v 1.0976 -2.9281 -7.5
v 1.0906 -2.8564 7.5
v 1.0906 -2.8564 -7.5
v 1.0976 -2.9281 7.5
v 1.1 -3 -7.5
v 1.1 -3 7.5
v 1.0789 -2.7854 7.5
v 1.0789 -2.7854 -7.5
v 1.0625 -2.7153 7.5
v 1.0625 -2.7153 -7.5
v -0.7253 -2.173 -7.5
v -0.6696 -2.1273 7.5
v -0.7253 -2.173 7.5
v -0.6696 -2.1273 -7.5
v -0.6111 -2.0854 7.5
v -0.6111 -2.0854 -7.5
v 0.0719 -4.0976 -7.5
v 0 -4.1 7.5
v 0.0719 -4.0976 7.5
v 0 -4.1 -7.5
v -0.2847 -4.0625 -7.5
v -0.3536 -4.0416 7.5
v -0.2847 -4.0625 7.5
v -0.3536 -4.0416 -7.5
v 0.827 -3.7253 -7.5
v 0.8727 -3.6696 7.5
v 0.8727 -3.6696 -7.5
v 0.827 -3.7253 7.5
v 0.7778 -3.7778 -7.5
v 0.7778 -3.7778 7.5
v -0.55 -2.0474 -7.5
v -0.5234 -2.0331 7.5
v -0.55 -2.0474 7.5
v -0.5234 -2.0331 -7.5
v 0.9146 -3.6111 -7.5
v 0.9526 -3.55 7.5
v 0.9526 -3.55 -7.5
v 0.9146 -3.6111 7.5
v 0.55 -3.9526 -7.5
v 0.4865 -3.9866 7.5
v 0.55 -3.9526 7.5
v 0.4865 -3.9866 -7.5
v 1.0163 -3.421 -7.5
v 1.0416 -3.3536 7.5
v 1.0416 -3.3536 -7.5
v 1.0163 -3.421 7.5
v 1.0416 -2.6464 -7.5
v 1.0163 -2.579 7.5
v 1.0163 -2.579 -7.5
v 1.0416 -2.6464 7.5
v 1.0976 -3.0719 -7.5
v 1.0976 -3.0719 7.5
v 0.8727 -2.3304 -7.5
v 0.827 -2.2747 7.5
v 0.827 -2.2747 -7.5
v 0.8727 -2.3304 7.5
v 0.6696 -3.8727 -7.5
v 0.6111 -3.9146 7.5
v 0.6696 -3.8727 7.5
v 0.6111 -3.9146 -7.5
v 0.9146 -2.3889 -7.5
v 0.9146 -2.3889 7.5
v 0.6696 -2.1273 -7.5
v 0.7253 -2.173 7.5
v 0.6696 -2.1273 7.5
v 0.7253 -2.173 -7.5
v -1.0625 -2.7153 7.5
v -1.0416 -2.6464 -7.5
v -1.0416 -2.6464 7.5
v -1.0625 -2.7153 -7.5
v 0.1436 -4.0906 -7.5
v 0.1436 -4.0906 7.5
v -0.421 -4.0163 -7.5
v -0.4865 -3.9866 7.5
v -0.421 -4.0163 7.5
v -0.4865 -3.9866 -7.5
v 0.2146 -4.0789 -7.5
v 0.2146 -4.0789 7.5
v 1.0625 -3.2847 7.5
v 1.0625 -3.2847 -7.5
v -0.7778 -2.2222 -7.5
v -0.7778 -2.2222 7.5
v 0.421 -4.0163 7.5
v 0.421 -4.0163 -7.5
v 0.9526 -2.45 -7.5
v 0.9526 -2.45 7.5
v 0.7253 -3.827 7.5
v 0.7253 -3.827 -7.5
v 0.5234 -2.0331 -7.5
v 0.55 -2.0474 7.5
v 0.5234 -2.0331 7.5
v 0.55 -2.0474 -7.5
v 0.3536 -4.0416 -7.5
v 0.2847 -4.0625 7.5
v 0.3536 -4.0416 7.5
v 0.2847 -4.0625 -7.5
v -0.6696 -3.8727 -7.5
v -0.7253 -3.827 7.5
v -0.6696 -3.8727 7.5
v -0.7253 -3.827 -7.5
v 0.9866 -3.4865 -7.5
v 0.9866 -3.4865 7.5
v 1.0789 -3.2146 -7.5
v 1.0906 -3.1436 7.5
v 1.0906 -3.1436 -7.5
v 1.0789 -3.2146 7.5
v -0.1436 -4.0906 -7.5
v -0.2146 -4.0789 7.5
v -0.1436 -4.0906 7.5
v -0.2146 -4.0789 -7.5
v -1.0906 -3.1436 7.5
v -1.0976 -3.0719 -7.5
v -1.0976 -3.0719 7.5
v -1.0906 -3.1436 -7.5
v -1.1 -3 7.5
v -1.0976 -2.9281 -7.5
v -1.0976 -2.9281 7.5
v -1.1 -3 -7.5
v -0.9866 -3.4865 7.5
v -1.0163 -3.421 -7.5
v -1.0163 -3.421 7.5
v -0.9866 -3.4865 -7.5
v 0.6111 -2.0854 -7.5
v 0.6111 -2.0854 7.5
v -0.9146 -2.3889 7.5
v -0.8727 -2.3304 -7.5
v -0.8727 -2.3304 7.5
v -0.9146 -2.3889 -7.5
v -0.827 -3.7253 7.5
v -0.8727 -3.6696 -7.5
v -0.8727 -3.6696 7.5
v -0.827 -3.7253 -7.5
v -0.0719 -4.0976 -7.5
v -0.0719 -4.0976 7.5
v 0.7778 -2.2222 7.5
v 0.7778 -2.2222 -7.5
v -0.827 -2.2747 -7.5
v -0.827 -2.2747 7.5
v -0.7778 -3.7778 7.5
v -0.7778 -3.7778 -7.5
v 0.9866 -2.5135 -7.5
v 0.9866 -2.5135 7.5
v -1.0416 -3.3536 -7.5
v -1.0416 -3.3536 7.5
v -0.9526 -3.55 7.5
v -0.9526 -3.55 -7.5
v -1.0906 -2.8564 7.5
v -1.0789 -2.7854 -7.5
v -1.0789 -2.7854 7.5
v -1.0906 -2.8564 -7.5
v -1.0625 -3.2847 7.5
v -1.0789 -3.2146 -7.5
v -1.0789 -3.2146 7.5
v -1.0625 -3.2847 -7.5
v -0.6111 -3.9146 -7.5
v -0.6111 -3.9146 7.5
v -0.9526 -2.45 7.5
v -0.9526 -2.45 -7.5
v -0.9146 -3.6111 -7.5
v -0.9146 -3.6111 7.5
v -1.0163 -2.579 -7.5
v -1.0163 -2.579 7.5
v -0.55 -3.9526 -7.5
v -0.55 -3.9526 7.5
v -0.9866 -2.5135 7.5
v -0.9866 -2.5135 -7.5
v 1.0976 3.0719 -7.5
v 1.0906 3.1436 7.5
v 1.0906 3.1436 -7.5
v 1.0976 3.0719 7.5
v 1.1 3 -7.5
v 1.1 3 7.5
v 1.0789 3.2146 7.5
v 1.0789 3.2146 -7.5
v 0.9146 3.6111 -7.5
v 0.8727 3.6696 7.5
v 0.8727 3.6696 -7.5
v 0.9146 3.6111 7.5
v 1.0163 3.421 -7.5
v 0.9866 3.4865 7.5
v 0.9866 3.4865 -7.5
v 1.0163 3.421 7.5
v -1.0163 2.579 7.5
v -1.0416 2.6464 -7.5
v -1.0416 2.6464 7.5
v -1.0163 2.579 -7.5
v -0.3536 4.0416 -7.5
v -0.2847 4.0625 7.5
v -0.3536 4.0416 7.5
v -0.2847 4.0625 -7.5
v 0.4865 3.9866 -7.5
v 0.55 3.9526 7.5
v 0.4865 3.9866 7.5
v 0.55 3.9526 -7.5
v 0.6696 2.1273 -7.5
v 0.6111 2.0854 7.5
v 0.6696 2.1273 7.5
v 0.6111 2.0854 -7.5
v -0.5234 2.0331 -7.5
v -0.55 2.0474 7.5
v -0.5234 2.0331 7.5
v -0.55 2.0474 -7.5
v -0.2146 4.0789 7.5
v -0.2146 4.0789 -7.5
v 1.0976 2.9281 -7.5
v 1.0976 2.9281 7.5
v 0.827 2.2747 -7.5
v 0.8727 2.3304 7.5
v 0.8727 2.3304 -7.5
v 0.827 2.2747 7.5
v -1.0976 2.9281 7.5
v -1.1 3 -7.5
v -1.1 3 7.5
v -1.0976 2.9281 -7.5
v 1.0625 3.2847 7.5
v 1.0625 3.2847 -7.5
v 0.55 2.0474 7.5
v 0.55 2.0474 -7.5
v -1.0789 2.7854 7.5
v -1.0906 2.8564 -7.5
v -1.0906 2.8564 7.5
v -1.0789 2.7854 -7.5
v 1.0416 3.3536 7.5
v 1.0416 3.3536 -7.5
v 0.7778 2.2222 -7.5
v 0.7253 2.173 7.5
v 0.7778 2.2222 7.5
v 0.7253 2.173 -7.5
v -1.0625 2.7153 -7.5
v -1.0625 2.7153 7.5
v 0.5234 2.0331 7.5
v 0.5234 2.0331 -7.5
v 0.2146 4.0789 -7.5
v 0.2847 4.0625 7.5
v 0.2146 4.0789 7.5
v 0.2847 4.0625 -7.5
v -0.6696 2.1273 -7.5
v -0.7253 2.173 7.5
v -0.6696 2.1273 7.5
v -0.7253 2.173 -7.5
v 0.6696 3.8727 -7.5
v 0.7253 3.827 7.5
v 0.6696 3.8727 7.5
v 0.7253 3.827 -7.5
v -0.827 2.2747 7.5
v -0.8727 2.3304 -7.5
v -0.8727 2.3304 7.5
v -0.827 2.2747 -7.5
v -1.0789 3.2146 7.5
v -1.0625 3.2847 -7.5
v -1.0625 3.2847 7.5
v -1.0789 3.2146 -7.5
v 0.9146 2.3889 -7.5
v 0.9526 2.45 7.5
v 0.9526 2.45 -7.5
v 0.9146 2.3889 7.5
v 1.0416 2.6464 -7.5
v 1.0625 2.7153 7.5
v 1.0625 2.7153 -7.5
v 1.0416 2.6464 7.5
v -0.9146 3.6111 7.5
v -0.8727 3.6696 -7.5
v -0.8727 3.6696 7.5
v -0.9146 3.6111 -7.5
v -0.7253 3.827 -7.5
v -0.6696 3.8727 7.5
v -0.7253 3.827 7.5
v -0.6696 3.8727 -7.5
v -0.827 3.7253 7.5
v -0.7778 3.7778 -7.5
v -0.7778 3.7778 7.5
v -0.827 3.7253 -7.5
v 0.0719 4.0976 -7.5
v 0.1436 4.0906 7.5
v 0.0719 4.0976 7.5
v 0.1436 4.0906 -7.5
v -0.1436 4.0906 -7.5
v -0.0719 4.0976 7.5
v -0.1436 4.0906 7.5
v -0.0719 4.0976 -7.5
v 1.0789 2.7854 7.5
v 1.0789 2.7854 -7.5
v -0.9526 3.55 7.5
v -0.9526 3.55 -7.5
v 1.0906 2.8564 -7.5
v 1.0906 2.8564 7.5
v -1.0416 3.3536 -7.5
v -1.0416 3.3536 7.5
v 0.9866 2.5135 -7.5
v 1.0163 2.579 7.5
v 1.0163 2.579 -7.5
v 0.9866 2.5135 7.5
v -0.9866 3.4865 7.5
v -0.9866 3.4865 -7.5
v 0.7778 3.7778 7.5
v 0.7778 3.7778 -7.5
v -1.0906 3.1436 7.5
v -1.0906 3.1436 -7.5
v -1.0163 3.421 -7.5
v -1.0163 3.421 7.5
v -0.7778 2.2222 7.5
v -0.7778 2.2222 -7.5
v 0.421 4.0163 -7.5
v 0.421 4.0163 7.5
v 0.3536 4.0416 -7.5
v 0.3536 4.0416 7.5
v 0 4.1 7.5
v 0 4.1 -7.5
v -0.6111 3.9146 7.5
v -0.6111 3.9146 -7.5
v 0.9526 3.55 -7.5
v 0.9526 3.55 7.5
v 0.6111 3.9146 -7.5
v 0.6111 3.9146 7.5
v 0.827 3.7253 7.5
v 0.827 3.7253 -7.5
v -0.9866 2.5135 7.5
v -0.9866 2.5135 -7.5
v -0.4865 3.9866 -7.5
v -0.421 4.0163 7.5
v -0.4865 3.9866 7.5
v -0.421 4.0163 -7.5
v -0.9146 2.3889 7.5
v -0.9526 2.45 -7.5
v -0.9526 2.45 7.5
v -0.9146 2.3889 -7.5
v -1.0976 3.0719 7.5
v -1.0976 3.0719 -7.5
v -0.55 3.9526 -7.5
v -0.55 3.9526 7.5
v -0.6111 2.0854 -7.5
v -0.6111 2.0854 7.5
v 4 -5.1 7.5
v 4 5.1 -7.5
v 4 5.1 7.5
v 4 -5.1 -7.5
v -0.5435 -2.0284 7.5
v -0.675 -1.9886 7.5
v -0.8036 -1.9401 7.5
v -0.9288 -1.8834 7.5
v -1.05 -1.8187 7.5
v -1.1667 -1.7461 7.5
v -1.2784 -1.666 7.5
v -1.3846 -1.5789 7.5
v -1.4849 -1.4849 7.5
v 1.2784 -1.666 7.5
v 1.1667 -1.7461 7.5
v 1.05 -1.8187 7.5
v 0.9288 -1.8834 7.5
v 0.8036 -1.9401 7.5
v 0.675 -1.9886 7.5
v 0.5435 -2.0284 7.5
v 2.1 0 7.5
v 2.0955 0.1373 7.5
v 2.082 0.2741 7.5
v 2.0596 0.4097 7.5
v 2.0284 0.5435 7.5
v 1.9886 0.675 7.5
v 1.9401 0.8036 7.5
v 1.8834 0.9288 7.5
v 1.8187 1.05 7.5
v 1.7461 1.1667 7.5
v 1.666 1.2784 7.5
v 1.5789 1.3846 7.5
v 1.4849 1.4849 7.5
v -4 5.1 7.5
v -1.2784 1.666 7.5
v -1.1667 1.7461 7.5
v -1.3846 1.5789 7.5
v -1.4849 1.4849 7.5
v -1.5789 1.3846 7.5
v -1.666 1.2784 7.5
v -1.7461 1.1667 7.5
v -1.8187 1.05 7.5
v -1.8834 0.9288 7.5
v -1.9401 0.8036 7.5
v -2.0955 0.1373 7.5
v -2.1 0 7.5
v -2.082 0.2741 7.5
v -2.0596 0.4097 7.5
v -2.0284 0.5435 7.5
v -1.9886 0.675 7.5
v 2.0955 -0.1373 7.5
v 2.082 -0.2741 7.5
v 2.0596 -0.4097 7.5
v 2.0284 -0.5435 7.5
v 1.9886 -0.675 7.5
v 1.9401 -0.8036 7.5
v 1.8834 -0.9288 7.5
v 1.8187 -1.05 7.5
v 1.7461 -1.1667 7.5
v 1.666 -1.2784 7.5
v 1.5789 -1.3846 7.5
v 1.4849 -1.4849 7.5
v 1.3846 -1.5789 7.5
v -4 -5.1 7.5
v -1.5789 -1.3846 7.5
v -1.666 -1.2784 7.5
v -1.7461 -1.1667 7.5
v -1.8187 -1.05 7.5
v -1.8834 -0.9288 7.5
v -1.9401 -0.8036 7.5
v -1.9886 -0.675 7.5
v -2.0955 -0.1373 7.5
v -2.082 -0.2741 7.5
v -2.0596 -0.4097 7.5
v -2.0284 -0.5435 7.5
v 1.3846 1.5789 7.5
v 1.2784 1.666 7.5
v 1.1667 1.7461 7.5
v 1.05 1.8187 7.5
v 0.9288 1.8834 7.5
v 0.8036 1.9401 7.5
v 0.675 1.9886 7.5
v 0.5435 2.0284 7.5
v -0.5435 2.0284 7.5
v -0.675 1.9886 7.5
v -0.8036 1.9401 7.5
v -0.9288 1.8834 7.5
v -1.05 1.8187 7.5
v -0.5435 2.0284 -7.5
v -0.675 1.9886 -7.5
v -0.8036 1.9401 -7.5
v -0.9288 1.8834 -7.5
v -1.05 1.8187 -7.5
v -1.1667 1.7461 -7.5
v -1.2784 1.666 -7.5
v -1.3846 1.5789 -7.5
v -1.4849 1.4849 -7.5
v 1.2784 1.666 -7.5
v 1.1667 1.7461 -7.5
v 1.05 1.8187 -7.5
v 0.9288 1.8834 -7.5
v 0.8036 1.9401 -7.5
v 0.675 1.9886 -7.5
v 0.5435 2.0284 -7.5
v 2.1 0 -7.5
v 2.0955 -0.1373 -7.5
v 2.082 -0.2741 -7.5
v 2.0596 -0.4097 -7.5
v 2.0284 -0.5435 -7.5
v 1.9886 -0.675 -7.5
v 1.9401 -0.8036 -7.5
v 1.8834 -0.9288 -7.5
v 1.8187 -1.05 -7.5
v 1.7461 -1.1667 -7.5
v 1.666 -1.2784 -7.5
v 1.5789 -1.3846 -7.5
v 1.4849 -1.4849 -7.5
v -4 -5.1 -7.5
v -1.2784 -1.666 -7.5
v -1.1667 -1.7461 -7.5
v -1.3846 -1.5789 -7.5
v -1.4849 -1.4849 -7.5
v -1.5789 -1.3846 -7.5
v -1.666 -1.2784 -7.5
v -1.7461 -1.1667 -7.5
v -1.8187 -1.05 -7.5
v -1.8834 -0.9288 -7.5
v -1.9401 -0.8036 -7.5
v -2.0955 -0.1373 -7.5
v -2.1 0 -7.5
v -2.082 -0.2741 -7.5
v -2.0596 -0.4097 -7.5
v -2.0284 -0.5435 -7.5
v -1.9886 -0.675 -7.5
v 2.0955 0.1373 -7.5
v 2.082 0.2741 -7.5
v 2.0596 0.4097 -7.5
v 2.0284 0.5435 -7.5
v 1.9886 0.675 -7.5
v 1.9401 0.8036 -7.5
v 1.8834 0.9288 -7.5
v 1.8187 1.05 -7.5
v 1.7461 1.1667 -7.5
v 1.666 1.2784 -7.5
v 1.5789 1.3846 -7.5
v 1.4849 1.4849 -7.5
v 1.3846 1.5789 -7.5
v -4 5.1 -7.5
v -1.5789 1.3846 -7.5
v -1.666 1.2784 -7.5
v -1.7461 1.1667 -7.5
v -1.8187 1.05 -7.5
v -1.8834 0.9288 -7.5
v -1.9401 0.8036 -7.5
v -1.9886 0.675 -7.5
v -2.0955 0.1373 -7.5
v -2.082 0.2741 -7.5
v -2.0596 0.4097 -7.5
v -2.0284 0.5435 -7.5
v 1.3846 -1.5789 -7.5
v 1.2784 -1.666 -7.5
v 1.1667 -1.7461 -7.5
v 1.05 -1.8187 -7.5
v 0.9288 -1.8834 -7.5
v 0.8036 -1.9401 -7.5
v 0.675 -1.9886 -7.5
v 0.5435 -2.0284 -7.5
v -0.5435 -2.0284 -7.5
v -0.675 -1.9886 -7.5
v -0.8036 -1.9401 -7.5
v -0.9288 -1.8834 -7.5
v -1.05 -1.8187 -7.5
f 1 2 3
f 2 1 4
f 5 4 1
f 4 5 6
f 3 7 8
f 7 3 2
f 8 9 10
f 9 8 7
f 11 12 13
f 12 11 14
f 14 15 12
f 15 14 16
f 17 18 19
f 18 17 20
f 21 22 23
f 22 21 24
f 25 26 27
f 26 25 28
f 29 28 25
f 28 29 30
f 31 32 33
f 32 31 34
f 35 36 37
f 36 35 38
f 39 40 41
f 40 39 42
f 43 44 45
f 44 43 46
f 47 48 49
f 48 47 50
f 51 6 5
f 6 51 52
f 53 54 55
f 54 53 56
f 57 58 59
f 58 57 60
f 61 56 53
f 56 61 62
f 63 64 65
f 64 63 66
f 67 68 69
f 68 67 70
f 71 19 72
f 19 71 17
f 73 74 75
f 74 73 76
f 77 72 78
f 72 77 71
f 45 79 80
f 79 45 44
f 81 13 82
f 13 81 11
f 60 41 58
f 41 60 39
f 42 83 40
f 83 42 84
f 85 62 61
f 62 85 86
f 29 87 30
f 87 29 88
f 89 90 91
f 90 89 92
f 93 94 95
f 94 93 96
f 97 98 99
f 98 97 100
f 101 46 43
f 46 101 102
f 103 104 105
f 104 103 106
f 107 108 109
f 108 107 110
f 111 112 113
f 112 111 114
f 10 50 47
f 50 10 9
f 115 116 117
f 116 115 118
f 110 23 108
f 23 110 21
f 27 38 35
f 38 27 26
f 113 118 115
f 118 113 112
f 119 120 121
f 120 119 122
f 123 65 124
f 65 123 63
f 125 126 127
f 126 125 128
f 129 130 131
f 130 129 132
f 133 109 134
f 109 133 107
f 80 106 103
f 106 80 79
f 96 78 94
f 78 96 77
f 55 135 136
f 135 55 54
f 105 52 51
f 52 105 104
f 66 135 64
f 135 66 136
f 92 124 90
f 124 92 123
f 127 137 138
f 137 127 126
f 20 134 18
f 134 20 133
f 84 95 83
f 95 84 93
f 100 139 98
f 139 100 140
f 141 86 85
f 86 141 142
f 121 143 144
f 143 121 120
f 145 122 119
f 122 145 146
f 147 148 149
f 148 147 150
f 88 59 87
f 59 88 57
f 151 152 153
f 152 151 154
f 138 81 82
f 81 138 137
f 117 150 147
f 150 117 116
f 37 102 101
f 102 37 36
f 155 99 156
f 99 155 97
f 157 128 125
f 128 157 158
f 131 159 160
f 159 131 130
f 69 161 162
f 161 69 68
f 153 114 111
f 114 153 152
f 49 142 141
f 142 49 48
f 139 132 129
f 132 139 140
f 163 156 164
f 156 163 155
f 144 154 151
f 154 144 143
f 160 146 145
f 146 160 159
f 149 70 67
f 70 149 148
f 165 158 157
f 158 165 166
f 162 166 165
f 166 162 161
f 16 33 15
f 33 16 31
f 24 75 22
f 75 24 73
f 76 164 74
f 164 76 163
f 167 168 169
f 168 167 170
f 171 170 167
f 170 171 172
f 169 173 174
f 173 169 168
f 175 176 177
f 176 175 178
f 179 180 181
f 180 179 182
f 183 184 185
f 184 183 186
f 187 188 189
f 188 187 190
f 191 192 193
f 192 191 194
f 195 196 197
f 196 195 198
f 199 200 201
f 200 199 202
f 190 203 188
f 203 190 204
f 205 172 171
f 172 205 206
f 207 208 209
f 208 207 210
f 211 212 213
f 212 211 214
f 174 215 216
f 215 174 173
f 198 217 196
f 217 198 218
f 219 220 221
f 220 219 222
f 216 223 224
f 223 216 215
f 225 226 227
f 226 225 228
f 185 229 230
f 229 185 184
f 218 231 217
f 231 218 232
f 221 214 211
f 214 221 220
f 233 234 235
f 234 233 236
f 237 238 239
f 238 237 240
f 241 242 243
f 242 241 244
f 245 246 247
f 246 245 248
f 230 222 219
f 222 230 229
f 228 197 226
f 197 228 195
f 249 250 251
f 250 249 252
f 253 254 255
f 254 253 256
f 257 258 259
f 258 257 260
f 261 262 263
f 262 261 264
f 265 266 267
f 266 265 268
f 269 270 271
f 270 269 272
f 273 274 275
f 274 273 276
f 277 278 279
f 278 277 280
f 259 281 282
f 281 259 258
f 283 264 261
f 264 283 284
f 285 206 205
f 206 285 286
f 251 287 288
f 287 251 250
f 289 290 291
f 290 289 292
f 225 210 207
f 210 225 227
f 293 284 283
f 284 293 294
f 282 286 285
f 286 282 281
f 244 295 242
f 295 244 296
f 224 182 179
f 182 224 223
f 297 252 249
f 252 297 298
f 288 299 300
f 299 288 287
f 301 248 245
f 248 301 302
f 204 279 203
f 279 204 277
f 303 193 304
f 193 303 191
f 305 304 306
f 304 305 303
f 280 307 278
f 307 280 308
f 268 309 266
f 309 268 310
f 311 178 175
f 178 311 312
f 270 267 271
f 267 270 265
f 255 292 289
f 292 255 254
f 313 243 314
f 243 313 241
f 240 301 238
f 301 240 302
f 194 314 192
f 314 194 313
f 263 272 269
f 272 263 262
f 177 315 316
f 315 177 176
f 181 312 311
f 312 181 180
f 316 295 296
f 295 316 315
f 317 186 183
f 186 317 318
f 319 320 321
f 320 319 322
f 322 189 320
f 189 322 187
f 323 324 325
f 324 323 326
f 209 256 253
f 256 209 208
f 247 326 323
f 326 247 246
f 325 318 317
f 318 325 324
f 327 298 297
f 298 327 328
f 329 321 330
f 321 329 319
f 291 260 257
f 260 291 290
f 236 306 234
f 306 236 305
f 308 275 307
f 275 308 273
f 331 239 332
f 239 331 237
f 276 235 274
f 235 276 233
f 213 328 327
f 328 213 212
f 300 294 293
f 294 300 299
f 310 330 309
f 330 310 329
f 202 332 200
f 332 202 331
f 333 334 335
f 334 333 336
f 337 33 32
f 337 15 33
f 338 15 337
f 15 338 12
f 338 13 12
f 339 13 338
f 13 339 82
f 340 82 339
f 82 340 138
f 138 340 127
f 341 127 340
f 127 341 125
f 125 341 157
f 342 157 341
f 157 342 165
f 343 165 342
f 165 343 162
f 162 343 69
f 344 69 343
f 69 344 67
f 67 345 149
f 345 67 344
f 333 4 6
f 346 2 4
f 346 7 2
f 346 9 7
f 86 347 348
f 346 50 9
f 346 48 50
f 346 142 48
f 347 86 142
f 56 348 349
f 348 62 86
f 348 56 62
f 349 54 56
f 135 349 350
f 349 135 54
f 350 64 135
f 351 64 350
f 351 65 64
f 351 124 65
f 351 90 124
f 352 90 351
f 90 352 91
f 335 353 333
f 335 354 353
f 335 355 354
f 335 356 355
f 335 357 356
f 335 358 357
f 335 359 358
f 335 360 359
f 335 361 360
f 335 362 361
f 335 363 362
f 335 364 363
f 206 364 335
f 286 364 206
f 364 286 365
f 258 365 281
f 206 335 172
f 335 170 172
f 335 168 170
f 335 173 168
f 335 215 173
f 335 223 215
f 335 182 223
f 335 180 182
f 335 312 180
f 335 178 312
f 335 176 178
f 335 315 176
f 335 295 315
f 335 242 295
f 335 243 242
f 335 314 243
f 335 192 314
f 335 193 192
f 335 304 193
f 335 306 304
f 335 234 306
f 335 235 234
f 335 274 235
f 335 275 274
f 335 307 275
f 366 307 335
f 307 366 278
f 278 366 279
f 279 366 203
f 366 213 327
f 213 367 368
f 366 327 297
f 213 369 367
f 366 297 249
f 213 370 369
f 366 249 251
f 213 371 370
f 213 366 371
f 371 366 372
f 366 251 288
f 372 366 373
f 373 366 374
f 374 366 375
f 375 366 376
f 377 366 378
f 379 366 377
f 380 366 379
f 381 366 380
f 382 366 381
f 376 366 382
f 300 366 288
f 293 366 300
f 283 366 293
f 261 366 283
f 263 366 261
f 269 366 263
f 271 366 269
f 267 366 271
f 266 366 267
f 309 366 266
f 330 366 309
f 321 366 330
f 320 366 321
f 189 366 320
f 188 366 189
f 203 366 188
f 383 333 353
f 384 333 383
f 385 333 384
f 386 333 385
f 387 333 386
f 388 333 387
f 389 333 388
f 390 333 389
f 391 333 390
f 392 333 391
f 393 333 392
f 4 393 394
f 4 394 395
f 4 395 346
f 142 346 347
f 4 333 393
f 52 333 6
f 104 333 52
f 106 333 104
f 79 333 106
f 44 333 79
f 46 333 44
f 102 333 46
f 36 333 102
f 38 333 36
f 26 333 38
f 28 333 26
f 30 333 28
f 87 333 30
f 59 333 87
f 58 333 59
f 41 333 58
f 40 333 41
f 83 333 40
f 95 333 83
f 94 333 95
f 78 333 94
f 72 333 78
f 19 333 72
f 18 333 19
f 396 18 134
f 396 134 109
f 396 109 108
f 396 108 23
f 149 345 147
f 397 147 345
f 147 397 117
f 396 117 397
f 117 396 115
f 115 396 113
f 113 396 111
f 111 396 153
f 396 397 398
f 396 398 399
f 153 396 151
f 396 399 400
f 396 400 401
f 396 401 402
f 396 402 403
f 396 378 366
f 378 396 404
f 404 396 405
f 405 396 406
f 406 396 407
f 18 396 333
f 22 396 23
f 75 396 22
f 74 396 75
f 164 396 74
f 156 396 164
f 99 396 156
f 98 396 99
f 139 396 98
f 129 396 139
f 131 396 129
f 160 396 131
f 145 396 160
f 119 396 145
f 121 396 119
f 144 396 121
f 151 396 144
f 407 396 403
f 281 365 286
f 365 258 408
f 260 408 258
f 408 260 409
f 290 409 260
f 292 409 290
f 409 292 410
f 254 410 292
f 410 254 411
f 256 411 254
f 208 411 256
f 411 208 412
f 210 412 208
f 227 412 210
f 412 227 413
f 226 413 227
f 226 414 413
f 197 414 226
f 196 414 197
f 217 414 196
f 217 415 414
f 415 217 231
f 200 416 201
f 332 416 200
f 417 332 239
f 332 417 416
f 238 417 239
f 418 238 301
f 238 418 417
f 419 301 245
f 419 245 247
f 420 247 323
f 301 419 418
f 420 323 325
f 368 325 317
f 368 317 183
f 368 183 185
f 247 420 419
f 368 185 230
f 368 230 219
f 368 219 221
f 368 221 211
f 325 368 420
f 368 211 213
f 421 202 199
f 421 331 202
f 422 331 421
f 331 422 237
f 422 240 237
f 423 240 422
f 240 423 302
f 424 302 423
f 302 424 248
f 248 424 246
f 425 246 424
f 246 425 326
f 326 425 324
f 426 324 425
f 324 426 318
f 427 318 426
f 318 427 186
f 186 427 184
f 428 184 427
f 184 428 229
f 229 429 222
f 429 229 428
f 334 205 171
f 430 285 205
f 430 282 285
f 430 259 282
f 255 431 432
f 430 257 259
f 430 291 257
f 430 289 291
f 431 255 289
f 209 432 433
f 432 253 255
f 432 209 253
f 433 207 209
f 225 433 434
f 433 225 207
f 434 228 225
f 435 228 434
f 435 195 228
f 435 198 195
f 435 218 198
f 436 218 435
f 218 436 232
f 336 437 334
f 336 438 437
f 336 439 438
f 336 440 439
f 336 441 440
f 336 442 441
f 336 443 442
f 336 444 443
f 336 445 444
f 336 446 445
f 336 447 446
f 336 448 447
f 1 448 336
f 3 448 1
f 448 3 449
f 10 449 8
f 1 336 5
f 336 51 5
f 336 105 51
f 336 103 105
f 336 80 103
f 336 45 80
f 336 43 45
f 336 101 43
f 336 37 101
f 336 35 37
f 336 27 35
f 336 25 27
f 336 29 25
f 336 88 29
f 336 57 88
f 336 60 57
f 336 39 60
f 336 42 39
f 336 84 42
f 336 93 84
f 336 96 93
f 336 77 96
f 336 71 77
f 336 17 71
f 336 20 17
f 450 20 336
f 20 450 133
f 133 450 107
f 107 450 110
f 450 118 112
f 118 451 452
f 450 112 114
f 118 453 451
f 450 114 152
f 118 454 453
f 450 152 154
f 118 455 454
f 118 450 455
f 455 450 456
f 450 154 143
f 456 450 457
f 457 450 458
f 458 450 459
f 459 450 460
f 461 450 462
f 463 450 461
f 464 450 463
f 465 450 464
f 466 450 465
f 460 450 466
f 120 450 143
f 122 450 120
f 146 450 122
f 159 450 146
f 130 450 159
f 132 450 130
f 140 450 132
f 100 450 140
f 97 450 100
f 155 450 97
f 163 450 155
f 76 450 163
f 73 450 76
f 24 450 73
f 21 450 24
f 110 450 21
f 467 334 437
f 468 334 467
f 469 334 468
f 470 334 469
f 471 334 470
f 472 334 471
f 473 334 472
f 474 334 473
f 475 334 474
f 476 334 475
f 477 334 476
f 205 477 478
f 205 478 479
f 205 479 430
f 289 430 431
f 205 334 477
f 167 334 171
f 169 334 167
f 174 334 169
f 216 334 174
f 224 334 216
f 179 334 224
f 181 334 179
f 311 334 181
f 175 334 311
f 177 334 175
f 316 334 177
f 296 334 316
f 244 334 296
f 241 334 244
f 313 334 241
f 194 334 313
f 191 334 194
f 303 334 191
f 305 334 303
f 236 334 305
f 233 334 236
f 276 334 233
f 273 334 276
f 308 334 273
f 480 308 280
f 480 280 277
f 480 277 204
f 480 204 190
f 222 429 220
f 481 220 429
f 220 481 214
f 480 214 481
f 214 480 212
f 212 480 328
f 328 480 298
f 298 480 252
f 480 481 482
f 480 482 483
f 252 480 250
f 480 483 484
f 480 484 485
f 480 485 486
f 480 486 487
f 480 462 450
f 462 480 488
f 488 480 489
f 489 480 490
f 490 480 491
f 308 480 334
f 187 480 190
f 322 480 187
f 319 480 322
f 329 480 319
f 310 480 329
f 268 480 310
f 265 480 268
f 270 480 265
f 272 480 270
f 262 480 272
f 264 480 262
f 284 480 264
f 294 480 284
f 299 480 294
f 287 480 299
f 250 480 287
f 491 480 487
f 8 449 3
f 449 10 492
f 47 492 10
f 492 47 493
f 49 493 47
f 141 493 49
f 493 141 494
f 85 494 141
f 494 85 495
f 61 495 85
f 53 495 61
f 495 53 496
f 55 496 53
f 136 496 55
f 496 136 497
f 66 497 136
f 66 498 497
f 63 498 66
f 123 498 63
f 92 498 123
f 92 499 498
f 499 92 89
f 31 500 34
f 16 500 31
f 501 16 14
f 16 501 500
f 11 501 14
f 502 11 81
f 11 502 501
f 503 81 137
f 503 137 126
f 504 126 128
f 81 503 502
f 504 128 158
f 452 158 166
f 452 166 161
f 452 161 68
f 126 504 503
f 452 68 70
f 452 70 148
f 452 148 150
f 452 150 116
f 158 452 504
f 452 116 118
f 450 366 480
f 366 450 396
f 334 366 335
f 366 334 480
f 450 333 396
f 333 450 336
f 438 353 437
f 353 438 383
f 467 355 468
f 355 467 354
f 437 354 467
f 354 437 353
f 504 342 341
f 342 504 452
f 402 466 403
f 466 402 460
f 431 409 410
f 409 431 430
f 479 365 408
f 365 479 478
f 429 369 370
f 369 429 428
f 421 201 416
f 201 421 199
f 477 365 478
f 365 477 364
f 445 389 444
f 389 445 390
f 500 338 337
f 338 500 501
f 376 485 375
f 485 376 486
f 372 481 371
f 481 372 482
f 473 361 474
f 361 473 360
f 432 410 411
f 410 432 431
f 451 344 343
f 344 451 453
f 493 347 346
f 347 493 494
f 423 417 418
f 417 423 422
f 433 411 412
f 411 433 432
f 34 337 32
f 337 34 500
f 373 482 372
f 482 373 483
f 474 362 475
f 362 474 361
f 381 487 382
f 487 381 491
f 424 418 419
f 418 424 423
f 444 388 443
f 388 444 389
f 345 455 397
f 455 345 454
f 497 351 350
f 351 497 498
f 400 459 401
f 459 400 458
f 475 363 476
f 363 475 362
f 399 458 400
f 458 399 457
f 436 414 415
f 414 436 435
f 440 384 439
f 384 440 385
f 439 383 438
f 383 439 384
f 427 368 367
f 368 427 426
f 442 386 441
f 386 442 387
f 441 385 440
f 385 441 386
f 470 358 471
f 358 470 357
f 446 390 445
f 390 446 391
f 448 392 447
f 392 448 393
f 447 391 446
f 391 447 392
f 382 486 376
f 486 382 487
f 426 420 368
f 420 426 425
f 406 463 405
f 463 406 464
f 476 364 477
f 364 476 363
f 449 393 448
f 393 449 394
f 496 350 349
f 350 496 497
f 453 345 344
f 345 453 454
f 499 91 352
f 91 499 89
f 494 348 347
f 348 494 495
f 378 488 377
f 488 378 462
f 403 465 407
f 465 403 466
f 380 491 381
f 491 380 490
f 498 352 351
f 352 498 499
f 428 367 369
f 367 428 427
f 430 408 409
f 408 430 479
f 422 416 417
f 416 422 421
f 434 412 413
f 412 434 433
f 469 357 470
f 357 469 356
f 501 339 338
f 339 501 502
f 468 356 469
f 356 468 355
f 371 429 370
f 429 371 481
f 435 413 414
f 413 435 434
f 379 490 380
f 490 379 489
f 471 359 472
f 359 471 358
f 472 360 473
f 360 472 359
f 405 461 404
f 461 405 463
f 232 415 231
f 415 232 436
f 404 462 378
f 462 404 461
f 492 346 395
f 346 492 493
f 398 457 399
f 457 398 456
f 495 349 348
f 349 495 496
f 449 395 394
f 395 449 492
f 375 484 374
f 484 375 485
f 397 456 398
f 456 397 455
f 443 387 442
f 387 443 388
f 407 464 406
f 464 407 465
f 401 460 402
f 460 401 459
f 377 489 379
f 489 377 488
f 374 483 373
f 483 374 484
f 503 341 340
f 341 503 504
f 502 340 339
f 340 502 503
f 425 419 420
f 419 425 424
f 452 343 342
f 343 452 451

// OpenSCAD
// Leadscrew nut housing, 8.0mm x 10.2mm x 15.0mm block
// Adds a central leadscrew bore and two mounting through-holes.
// Overall outer size remains exactly 8.0 x 10.2 x 15.0 (X x Y x Z).

$fn = 96;

block_w = 8.0;    // X
block_d = 10.2;   // Y
block_h = 15.0;   // Z

// Features (typical small nut housing details)
lead_bore_d = 4.2;     // leadscrew clearance bore (along Z)
mount_hole_d = 2.2;    // mounting holes (along Z)
mount_spacing_y = 6.0; // center-to-center spacing along Y

eps = 0.02;

module nut_housing() {
    difference() {
        // Outer block
        cube([block_w, block_d, block_h], center=true);

        // Central leadscrew bore (through Z)
        cylinder(d=lead_bore_d, h=block_h + 2*eps, center=true);

        // Two mounting holes (through Z), symmetric about Y
        for (sy = [-1, 1]) {
            translate([0, sy * mount_spacing_y/2, 0])
                cylinder(d=mount_hole_d, h=block_h + 2*eps, center=true);
        }
    }
}

nut_housing();
